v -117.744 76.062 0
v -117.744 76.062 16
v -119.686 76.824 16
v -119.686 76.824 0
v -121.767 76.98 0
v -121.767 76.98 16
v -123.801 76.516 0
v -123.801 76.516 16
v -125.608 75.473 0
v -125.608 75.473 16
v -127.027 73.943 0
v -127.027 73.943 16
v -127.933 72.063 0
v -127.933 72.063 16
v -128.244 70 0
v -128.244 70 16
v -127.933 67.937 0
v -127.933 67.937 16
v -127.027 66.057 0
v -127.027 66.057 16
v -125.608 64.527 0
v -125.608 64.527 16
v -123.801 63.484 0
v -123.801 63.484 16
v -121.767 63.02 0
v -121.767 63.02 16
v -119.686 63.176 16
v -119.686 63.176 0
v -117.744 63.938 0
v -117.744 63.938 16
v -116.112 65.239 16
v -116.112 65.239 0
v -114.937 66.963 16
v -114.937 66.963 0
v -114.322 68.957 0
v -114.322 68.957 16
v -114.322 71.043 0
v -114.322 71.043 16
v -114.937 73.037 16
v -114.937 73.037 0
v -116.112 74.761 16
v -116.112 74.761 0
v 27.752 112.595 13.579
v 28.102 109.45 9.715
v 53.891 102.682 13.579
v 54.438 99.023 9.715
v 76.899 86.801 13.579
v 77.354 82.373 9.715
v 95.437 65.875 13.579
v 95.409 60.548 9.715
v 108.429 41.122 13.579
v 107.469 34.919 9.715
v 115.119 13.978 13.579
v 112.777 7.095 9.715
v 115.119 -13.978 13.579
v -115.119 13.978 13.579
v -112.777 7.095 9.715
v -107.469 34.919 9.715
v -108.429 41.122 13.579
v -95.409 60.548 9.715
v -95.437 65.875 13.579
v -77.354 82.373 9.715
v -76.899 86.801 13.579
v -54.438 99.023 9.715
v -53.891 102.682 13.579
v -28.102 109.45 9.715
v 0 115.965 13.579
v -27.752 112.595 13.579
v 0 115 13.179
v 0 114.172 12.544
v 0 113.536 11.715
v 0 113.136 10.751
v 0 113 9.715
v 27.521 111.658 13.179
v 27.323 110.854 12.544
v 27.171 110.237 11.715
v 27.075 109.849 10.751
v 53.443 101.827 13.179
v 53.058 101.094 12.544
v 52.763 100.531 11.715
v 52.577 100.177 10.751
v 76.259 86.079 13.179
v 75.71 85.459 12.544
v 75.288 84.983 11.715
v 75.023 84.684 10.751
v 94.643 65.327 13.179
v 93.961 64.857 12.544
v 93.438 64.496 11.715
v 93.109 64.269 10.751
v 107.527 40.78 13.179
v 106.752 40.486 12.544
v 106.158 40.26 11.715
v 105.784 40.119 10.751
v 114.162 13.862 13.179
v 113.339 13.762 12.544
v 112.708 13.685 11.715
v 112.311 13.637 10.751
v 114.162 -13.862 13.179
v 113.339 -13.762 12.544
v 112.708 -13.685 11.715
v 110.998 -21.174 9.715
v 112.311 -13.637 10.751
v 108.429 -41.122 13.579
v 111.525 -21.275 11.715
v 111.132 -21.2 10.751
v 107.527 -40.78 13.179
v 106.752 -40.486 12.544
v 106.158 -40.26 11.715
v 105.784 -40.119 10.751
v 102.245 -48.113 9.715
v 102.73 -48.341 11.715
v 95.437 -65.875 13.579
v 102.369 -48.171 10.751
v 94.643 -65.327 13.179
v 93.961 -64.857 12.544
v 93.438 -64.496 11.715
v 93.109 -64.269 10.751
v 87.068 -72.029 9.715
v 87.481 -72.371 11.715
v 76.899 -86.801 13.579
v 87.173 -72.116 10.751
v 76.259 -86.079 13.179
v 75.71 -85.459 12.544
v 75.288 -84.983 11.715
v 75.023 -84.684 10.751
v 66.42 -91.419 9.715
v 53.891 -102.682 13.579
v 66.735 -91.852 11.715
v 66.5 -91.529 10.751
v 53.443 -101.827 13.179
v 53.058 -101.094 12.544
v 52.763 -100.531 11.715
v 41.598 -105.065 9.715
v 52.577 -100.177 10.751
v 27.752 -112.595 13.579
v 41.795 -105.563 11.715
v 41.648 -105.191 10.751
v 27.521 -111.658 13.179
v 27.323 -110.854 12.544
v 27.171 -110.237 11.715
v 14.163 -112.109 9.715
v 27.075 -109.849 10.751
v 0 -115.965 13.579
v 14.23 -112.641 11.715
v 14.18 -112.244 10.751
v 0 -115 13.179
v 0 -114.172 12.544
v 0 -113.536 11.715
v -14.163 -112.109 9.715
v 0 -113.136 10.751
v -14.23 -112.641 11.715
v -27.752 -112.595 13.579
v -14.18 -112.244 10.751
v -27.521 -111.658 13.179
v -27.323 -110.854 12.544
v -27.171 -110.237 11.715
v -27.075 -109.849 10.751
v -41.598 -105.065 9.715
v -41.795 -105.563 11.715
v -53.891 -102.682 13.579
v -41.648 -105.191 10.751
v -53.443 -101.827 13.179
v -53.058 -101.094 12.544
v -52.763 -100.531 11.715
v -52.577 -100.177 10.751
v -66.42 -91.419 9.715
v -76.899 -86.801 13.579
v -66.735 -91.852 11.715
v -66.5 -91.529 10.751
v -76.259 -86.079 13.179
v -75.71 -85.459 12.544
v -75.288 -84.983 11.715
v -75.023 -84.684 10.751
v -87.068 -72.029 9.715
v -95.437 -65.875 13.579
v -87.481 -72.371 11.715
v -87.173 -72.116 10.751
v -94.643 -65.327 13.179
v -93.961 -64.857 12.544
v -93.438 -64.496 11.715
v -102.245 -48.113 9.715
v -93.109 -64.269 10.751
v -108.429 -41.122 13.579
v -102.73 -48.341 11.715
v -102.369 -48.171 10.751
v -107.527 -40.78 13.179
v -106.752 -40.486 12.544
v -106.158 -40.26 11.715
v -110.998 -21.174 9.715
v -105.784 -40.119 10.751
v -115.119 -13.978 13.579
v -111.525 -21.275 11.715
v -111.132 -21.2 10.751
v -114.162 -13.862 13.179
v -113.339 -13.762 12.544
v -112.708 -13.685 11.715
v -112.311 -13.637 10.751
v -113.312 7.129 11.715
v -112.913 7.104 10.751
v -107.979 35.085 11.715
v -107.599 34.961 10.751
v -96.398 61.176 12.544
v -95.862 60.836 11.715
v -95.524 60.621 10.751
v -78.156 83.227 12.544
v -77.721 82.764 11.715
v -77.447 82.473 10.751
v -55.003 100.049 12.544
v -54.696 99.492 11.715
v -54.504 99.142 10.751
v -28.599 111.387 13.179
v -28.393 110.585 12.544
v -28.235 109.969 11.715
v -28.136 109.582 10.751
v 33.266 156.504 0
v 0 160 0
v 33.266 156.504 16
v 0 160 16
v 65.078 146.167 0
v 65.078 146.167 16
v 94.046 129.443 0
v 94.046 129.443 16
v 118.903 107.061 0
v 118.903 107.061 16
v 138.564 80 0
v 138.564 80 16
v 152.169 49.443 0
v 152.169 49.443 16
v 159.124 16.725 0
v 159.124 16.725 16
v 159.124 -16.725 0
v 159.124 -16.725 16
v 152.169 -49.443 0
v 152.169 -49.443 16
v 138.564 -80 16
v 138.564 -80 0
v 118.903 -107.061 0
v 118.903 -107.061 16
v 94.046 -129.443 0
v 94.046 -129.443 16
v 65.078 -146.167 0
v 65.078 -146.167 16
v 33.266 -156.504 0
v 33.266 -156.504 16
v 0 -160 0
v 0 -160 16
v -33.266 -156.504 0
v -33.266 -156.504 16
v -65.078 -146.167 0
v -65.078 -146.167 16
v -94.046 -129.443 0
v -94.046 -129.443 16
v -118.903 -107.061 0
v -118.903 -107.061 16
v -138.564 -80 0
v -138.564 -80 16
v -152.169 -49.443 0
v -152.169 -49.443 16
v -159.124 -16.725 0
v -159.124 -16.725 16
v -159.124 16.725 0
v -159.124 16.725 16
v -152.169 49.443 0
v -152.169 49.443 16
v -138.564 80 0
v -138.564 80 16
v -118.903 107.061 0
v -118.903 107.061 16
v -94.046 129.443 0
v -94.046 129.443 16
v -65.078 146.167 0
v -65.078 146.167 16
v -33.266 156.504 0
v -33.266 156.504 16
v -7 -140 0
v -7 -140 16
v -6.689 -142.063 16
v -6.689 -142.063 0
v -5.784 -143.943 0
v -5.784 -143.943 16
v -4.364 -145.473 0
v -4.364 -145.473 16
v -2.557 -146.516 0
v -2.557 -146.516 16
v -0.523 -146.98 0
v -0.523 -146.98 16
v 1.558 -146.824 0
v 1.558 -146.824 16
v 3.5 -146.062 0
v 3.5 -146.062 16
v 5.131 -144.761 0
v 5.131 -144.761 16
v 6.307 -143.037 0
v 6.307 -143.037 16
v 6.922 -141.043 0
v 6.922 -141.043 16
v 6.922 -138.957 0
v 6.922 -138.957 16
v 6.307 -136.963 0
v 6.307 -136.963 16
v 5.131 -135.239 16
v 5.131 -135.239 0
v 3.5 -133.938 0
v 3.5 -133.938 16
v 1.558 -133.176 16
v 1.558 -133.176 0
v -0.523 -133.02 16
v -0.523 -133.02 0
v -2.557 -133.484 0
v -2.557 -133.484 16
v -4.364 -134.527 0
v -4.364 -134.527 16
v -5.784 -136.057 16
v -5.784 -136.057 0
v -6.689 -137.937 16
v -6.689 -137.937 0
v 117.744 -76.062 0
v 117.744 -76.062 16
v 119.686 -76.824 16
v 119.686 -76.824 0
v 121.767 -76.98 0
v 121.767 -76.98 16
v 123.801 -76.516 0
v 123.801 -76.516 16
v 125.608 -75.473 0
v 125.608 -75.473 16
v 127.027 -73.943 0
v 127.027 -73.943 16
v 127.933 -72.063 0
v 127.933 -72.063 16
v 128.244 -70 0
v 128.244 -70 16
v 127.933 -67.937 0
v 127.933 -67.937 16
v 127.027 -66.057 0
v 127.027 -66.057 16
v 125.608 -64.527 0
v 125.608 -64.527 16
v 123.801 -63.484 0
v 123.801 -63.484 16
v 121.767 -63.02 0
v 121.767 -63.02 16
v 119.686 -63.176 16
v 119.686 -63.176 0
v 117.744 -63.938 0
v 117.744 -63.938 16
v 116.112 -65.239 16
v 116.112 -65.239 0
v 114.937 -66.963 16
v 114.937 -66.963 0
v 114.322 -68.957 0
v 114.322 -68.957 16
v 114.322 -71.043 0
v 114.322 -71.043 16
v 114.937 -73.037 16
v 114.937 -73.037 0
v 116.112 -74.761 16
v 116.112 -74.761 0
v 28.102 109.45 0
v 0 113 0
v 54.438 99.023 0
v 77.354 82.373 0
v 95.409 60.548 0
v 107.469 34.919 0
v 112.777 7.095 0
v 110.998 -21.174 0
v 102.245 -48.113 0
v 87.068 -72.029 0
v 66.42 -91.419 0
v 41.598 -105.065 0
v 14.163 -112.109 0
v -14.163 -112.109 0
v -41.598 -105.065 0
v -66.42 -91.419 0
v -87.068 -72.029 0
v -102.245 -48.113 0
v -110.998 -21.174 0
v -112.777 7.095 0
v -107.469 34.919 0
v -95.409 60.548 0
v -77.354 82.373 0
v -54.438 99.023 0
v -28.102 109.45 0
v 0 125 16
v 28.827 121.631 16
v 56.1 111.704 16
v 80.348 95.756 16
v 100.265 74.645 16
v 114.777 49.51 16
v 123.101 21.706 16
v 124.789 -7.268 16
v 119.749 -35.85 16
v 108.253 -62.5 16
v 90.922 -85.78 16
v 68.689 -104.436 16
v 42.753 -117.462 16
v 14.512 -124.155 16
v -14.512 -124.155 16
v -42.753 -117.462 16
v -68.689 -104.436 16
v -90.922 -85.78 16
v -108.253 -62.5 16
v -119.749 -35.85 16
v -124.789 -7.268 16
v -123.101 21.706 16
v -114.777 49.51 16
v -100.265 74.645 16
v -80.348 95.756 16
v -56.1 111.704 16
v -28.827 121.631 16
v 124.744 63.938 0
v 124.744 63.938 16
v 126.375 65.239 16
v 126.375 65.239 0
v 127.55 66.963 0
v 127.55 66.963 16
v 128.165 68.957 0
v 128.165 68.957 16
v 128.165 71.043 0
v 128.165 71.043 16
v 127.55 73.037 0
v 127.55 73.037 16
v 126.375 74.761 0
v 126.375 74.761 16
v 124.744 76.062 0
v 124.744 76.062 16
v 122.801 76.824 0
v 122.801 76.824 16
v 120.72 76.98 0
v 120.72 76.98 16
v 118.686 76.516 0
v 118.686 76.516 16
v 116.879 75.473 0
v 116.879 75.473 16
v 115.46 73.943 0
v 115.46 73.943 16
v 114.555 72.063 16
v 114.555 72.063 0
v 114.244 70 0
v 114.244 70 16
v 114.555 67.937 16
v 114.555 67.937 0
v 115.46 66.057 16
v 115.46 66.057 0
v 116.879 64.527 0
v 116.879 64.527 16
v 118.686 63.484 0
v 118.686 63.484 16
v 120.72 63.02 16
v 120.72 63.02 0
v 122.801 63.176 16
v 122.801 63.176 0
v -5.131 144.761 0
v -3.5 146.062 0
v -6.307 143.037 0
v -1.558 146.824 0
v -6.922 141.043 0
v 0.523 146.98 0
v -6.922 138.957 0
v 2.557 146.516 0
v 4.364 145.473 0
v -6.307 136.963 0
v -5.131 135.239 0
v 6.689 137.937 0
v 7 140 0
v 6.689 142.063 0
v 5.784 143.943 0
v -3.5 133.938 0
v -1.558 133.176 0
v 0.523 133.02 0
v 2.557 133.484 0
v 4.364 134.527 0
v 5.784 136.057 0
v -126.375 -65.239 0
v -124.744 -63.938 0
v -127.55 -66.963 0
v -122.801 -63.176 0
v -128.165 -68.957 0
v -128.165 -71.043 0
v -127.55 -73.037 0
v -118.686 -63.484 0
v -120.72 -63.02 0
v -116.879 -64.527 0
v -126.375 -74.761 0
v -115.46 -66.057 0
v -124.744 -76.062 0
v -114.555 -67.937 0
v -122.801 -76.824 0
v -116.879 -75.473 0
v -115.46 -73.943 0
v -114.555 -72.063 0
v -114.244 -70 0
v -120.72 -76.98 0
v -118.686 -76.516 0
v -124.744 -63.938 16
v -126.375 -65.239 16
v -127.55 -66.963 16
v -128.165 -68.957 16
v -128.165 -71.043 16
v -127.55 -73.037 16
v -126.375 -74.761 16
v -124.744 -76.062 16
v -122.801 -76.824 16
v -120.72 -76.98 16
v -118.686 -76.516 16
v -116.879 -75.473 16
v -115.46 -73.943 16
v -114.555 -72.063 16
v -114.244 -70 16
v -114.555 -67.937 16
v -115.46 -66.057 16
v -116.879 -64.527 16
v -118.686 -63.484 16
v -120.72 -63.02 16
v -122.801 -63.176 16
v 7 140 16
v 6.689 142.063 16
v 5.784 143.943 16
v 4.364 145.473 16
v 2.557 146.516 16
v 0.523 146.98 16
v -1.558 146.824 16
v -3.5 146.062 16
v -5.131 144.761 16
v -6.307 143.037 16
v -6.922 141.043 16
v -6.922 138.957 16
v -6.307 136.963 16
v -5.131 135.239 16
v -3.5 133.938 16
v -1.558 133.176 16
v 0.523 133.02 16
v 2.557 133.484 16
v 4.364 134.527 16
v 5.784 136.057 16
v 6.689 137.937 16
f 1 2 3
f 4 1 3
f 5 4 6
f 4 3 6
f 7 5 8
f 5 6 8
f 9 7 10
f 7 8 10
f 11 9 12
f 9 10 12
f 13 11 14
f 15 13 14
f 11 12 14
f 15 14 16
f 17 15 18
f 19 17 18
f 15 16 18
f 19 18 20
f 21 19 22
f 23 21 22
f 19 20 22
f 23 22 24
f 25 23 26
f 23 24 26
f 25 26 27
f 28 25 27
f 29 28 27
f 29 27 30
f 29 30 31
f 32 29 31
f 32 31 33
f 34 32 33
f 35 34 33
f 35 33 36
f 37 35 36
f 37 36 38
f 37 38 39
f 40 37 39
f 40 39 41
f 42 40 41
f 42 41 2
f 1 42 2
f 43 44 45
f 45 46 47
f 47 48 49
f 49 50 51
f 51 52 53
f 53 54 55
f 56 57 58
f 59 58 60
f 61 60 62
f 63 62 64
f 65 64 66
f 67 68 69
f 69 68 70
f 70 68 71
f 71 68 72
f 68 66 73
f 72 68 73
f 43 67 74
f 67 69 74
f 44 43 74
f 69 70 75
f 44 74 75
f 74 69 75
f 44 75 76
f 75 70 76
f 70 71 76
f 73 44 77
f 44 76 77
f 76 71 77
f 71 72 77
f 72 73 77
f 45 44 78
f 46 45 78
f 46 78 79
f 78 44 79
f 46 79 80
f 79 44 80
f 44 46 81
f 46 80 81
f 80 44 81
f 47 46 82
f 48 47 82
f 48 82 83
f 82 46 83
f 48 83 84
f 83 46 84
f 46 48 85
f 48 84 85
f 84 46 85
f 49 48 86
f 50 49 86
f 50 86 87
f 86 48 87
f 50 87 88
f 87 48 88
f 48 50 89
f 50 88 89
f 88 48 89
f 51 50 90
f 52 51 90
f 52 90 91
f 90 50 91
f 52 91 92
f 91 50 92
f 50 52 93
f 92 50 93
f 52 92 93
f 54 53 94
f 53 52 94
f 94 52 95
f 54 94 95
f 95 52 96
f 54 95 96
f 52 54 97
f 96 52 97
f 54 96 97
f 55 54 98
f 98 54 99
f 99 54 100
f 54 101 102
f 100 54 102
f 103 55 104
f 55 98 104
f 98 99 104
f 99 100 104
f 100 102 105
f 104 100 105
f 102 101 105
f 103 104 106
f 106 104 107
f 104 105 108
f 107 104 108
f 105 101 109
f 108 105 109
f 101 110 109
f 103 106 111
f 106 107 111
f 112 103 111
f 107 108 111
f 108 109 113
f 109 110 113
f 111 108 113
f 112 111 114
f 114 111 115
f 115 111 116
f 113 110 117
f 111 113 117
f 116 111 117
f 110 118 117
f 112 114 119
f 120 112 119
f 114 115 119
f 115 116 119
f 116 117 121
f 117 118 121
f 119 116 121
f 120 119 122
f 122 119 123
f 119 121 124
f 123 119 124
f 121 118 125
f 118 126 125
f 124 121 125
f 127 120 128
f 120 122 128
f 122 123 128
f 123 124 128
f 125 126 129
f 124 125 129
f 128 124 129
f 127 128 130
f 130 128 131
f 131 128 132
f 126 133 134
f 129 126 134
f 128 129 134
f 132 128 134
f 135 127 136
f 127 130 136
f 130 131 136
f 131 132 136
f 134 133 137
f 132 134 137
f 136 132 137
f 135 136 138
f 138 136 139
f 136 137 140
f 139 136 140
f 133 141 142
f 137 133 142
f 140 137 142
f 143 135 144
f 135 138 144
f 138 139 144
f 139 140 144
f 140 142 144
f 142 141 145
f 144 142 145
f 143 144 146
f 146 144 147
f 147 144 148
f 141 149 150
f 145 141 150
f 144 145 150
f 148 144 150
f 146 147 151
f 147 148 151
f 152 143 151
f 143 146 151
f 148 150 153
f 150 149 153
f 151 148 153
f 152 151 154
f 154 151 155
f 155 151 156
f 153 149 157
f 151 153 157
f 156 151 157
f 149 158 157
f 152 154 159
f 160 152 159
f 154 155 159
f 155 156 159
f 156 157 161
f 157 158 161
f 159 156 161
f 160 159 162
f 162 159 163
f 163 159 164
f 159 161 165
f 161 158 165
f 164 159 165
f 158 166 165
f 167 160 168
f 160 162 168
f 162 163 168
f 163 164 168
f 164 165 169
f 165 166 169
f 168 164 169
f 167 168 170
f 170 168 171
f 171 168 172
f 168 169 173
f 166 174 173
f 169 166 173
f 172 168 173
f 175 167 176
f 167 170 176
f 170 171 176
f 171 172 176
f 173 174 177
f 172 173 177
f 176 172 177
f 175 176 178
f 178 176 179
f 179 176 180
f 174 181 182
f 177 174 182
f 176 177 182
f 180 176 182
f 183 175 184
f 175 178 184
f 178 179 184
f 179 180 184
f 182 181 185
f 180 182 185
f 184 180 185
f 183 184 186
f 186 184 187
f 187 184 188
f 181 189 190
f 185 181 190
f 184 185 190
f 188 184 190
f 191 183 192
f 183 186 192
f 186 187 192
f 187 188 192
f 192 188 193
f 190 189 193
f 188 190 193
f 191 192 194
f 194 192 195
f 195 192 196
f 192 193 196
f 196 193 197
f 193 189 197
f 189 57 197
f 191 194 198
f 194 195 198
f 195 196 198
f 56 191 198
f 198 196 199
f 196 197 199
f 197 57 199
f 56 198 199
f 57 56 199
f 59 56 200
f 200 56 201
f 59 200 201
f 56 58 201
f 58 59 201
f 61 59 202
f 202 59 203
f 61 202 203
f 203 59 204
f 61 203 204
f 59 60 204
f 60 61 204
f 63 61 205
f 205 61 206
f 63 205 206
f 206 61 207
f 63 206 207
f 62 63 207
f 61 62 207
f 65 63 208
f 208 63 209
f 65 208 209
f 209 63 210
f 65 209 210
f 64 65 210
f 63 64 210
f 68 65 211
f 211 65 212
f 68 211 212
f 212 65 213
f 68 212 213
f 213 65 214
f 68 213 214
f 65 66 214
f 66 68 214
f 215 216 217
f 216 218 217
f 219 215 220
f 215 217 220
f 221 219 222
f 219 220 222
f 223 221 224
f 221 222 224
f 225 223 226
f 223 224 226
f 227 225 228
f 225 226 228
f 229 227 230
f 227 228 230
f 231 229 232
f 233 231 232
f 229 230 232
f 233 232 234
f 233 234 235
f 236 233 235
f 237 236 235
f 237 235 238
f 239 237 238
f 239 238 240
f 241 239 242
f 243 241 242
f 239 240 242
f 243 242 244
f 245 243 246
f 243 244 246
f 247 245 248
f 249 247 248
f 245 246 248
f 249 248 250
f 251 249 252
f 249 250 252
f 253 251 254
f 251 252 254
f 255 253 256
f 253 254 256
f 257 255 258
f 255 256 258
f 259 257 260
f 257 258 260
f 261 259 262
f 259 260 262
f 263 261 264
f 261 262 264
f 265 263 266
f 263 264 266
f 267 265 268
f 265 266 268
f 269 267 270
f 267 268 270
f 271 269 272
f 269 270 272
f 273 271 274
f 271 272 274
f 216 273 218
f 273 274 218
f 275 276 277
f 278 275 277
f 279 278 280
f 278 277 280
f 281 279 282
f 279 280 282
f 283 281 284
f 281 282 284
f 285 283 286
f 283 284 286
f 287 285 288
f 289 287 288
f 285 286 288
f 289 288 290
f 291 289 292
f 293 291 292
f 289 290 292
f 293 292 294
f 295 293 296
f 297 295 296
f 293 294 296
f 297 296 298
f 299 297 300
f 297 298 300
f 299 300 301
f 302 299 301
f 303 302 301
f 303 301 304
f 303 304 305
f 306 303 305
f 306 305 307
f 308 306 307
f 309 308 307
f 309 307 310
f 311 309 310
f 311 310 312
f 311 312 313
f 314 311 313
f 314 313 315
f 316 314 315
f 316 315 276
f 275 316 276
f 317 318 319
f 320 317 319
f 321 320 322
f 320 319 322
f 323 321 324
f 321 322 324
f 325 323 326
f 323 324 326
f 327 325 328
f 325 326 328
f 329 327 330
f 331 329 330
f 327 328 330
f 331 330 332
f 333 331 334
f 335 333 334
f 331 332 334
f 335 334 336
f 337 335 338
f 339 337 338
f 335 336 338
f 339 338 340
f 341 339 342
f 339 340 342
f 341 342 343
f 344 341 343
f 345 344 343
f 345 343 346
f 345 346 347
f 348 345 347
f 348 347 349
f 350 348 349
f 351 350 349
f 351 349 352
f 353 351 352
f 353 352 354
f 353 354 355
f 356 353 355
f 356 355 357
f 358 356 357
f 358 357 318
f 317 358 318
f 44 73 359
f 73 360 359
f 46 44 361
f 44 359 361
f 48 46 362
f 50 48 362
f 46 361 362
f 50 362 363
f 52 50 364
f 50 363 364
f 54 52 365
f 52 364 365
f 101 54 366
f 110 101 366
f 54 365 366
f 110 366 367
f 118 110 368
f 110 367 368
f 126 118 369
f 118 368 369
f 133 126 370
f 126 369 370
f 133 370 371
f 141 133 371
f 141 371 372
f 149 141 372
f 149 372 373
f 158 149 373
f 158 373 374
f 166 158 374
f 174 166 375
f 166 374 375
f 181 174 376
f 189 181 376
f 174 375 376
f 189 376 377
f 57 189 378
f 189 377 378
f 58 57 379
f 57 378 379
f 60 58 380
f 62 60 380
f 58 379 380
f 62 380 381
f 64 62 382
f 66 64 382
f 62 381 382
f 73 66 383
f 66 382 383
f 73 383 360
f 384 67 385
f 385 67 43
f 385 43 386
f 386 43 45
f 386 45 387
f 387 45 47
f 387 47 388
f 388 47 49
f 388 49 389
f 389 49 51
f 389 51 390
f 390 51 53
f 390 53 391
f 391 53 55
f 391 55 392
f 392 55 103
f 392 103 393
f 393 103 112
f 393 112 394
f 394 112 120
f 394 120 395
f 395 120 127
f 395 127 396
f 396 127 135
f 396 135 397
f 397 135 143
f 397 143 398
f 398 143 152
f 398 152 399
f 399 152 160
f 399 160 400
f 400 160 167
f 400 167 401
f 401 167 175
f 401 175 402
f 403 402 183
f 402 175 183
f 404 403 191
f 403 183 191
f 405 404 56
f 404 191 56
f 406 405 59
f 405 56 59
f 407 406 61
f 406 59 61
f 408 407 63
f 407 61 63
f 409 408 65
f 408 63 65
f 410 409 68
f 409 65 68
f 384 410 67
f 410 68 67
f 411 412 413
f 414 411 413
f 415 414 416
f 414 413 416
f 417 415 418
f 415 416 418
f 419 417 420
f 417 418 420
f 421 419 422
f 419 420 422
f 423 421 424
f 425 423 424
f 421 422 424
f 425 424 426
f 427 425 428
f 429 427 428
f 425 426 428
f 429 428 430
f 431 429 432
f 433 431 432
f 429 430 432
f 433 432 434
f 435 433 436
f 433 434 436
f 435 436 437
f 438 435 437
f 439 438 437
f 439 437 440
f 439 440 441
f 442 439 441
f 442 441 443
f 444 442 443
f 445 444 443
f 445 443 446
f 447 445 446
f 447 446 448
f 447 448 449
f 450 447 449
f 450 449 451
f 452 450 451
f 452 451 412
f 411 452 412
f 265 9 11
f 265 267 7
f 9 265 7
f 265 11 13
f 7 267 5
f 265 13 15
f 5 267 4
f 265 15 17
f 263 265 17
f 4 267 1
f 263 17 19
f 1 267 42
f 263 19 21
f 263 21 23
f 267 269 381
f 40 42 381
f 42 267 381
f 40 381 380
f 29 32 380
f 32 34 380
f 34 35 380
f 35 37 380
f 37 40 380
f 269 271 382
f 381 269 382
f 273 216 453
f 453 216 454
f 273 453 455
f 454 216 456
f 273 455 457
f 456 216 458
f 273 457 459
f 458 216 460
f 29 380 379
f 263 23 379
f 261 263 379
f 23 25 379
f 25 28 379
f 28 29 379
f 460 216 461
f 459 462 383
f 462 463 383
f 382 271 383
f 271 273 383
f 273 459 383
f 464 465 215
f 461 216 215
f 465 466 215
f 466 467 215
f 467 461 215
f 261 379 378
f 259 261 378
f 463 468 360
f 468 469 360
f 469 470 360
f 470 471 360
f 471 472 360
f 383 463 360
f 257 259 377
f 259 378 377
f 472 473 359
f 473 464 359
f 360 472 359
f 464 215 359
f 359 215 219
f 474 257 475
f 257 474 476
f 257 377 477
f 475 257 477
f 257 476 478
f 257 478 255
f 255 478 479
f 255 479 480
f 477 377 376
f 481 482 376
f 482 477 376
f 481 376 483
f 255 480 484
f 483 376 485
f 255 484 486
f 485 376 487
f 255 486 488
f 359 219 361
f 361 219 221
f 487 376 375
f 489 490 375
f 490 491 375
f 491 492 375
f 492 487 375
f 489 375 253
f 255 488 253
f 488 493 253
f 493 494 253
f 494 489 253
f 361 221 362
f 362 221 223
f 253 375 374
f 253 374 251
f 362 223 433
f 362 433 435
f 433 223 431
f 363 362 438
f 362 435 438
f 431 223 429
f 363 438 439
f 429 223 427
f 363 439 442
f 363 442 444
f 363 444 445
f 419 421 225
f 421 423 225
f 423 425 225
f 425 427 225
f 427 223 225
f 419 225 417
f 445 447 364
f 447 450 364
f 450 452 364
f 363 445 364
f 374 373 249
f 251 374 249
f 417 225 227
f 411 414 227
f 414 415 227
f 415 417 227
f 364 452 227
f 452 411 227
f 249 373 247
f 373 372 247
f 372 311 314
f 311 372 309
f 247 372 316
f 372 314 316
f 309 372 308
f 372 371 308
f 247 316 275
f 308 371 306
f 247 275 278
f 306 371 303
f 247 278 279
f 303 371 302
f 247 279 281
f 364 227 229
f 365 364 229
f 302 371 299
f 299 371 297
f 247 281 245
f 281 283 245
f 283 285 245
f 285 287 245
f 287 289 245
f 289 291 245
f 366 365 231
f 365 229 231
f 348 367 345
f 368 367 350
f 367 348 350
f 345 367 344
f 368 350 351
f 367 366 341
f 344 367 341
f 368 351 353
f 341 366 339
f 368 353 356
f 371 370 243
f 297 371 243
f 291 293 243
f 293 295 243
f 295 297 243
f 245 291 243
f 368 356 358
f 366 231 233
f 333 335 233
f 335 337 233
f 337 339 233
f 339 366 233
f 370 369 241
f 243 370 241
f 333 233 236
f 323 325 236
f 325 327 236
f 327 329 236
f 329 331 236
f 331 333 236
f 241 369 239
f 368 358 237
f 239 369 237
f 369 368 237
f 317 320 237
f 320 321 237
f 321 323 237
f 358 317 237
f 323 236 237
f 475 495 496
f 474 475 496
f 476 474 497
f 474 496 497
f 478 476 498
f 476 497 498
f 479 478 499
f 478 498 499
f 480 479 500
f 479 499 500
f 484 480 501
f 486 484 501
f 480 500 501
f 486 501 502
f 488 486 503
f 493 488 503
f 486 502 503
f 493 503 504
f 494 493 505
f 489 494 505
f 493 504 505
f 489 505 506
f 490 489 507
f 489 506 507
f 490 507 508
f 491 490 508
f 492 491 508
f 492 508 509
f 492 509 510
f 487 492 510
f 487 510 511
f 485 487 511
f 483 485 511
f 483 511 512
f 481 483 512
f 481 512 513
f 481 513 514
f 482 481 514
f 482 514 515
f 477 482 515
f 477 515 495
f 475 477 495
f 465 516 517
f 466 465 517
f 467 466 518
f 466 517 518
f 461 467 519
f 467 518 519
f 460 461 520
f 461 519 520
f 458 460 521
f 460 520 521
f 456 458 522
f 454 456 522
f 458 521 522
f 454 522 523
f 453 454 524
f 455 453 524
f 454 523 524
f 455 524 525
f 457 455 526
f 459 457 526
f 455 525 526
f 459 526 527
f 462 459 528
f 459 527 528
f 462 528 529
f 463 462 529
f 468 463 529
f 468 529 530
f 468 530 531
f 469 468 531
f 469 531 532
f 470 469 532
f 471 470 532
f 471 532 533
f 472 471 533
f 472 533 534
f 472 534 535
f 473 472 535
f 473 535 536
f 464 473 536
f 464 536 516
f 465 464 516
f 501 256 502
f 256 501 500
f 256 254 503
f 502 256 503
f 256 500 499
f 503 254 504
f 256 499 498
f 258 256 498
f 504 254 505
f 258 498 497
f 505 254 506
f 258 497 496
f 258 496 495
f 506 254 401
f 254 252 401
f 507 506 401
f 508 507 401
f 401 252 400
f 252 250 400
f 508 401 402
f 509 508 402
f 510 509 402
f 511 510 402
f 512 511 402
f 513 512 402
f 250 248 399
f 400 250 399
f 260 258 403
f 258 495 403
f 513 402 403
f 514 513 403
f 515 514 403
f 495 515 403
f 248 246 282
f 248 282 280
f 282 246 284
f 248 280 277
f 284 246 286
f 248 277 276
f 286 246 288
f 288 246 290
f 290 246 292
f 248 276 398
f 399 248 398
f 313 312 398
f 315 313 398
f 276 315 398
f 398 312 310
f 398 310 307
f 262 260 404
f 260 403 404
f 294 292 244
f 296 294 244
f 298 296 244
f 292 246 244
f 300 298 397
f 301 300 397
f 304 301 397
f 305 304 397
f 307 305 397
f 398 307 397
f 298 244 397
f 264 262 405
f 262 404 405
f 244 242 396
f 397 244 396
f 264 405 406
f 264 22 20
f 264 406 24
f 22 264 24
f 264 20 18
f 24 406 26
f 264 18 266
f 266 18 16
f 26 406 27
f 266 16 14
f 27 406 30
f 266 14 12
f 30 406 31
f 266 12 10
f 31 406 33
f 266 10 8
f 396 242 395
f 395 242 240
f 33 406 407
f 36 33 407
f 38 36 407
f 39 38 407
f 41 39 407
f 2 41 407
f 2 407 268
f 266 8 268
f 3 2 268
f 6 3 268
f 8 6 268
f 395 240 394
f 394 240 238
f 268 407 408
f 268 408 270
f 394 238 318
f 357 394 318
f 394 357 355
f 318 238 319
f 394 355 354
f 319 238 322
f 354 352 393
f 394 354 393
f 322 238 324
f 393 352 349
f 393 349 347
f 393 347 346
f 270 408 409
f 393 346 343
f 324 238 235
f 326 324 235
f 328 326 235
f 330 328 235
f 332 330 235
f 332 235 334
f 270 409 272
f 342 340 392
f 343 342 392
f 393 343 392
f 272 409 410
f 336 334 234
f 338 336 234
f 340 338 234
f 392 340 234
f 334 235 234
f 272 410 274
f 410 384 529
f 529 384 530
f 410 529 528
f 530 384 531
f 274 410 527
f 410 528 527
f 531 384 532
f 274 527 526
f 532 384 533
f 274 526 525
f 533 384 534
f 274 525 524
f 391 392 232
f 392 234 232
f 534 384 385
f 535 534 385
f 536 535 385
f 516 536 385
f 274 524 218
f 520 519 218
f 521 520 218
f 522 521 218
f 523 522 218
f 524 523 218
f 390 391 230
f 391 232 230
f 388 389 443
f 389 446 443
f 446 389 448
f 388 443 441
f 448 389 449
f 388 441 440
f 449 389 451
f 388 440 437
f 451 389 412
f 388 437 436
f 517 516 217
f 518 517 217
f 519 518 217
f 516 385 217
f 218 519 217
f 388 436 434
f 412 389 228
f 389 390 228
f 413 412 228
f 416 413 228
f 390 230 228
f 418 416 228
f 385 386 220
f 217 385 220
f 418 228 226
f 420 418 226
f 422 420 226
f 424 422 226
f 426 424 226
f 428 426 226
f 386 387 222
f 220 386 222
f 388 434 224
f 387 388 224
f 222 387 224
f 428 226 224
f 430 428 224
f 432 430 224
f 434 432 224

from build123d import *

# Parameters (mm, degrees)
F2_R            = 7
F3_DEPTH        = 25
F3_COPIES_COUNT = 6


# Not quite as in the source:
# - a pattern or mirror of a feature is missing from the dataset's text; its kind, count and spacing are read off the source's solid


with BuildPart() as f1:
    # F0 (on Right) → F1 (revolve)
    with BuildSketch(Plane.YZ):
        with BuildLine():
            Line((160, 16), (125, 16))
            Line((125, 16), (115.9647238196, 13.5790050441))
            ThreePointArc((115.9647238196, 13.5790050441), (113.8265866388, 12.1503474549), (113, 9.7153017389))
            Line((113, 9.7153017389), (113, 0))
            Line((113, 0), (160, 0))
            Line((160, 0), (160, 16))
        make_face()
    revolve(axis=Axis((0, 0, -1.8696532477), (0, 0, -1)))

    # F2 (on face) → F3 (cut)
    with BuildSketch(Plane.XY.offset(16)):
        with Locations((0, 140)):
            Circle(F2_R)
    f3 = extrude(amount=-F3_DEPTH, mode=Mode.SUBTRACT)

    # F3_copies: F3 ×6 about axis
    f3_copies_axis = Axis((0, 0, 0), (0, 0, 1))
    for i in range(1, F3_COPIES_COUNT):
        add(f3.rotate(f3_copies_axis, i * 360 / F3_COPIES_COUNT), mode=Mode.SUBTRACT)


solid = f1.part
